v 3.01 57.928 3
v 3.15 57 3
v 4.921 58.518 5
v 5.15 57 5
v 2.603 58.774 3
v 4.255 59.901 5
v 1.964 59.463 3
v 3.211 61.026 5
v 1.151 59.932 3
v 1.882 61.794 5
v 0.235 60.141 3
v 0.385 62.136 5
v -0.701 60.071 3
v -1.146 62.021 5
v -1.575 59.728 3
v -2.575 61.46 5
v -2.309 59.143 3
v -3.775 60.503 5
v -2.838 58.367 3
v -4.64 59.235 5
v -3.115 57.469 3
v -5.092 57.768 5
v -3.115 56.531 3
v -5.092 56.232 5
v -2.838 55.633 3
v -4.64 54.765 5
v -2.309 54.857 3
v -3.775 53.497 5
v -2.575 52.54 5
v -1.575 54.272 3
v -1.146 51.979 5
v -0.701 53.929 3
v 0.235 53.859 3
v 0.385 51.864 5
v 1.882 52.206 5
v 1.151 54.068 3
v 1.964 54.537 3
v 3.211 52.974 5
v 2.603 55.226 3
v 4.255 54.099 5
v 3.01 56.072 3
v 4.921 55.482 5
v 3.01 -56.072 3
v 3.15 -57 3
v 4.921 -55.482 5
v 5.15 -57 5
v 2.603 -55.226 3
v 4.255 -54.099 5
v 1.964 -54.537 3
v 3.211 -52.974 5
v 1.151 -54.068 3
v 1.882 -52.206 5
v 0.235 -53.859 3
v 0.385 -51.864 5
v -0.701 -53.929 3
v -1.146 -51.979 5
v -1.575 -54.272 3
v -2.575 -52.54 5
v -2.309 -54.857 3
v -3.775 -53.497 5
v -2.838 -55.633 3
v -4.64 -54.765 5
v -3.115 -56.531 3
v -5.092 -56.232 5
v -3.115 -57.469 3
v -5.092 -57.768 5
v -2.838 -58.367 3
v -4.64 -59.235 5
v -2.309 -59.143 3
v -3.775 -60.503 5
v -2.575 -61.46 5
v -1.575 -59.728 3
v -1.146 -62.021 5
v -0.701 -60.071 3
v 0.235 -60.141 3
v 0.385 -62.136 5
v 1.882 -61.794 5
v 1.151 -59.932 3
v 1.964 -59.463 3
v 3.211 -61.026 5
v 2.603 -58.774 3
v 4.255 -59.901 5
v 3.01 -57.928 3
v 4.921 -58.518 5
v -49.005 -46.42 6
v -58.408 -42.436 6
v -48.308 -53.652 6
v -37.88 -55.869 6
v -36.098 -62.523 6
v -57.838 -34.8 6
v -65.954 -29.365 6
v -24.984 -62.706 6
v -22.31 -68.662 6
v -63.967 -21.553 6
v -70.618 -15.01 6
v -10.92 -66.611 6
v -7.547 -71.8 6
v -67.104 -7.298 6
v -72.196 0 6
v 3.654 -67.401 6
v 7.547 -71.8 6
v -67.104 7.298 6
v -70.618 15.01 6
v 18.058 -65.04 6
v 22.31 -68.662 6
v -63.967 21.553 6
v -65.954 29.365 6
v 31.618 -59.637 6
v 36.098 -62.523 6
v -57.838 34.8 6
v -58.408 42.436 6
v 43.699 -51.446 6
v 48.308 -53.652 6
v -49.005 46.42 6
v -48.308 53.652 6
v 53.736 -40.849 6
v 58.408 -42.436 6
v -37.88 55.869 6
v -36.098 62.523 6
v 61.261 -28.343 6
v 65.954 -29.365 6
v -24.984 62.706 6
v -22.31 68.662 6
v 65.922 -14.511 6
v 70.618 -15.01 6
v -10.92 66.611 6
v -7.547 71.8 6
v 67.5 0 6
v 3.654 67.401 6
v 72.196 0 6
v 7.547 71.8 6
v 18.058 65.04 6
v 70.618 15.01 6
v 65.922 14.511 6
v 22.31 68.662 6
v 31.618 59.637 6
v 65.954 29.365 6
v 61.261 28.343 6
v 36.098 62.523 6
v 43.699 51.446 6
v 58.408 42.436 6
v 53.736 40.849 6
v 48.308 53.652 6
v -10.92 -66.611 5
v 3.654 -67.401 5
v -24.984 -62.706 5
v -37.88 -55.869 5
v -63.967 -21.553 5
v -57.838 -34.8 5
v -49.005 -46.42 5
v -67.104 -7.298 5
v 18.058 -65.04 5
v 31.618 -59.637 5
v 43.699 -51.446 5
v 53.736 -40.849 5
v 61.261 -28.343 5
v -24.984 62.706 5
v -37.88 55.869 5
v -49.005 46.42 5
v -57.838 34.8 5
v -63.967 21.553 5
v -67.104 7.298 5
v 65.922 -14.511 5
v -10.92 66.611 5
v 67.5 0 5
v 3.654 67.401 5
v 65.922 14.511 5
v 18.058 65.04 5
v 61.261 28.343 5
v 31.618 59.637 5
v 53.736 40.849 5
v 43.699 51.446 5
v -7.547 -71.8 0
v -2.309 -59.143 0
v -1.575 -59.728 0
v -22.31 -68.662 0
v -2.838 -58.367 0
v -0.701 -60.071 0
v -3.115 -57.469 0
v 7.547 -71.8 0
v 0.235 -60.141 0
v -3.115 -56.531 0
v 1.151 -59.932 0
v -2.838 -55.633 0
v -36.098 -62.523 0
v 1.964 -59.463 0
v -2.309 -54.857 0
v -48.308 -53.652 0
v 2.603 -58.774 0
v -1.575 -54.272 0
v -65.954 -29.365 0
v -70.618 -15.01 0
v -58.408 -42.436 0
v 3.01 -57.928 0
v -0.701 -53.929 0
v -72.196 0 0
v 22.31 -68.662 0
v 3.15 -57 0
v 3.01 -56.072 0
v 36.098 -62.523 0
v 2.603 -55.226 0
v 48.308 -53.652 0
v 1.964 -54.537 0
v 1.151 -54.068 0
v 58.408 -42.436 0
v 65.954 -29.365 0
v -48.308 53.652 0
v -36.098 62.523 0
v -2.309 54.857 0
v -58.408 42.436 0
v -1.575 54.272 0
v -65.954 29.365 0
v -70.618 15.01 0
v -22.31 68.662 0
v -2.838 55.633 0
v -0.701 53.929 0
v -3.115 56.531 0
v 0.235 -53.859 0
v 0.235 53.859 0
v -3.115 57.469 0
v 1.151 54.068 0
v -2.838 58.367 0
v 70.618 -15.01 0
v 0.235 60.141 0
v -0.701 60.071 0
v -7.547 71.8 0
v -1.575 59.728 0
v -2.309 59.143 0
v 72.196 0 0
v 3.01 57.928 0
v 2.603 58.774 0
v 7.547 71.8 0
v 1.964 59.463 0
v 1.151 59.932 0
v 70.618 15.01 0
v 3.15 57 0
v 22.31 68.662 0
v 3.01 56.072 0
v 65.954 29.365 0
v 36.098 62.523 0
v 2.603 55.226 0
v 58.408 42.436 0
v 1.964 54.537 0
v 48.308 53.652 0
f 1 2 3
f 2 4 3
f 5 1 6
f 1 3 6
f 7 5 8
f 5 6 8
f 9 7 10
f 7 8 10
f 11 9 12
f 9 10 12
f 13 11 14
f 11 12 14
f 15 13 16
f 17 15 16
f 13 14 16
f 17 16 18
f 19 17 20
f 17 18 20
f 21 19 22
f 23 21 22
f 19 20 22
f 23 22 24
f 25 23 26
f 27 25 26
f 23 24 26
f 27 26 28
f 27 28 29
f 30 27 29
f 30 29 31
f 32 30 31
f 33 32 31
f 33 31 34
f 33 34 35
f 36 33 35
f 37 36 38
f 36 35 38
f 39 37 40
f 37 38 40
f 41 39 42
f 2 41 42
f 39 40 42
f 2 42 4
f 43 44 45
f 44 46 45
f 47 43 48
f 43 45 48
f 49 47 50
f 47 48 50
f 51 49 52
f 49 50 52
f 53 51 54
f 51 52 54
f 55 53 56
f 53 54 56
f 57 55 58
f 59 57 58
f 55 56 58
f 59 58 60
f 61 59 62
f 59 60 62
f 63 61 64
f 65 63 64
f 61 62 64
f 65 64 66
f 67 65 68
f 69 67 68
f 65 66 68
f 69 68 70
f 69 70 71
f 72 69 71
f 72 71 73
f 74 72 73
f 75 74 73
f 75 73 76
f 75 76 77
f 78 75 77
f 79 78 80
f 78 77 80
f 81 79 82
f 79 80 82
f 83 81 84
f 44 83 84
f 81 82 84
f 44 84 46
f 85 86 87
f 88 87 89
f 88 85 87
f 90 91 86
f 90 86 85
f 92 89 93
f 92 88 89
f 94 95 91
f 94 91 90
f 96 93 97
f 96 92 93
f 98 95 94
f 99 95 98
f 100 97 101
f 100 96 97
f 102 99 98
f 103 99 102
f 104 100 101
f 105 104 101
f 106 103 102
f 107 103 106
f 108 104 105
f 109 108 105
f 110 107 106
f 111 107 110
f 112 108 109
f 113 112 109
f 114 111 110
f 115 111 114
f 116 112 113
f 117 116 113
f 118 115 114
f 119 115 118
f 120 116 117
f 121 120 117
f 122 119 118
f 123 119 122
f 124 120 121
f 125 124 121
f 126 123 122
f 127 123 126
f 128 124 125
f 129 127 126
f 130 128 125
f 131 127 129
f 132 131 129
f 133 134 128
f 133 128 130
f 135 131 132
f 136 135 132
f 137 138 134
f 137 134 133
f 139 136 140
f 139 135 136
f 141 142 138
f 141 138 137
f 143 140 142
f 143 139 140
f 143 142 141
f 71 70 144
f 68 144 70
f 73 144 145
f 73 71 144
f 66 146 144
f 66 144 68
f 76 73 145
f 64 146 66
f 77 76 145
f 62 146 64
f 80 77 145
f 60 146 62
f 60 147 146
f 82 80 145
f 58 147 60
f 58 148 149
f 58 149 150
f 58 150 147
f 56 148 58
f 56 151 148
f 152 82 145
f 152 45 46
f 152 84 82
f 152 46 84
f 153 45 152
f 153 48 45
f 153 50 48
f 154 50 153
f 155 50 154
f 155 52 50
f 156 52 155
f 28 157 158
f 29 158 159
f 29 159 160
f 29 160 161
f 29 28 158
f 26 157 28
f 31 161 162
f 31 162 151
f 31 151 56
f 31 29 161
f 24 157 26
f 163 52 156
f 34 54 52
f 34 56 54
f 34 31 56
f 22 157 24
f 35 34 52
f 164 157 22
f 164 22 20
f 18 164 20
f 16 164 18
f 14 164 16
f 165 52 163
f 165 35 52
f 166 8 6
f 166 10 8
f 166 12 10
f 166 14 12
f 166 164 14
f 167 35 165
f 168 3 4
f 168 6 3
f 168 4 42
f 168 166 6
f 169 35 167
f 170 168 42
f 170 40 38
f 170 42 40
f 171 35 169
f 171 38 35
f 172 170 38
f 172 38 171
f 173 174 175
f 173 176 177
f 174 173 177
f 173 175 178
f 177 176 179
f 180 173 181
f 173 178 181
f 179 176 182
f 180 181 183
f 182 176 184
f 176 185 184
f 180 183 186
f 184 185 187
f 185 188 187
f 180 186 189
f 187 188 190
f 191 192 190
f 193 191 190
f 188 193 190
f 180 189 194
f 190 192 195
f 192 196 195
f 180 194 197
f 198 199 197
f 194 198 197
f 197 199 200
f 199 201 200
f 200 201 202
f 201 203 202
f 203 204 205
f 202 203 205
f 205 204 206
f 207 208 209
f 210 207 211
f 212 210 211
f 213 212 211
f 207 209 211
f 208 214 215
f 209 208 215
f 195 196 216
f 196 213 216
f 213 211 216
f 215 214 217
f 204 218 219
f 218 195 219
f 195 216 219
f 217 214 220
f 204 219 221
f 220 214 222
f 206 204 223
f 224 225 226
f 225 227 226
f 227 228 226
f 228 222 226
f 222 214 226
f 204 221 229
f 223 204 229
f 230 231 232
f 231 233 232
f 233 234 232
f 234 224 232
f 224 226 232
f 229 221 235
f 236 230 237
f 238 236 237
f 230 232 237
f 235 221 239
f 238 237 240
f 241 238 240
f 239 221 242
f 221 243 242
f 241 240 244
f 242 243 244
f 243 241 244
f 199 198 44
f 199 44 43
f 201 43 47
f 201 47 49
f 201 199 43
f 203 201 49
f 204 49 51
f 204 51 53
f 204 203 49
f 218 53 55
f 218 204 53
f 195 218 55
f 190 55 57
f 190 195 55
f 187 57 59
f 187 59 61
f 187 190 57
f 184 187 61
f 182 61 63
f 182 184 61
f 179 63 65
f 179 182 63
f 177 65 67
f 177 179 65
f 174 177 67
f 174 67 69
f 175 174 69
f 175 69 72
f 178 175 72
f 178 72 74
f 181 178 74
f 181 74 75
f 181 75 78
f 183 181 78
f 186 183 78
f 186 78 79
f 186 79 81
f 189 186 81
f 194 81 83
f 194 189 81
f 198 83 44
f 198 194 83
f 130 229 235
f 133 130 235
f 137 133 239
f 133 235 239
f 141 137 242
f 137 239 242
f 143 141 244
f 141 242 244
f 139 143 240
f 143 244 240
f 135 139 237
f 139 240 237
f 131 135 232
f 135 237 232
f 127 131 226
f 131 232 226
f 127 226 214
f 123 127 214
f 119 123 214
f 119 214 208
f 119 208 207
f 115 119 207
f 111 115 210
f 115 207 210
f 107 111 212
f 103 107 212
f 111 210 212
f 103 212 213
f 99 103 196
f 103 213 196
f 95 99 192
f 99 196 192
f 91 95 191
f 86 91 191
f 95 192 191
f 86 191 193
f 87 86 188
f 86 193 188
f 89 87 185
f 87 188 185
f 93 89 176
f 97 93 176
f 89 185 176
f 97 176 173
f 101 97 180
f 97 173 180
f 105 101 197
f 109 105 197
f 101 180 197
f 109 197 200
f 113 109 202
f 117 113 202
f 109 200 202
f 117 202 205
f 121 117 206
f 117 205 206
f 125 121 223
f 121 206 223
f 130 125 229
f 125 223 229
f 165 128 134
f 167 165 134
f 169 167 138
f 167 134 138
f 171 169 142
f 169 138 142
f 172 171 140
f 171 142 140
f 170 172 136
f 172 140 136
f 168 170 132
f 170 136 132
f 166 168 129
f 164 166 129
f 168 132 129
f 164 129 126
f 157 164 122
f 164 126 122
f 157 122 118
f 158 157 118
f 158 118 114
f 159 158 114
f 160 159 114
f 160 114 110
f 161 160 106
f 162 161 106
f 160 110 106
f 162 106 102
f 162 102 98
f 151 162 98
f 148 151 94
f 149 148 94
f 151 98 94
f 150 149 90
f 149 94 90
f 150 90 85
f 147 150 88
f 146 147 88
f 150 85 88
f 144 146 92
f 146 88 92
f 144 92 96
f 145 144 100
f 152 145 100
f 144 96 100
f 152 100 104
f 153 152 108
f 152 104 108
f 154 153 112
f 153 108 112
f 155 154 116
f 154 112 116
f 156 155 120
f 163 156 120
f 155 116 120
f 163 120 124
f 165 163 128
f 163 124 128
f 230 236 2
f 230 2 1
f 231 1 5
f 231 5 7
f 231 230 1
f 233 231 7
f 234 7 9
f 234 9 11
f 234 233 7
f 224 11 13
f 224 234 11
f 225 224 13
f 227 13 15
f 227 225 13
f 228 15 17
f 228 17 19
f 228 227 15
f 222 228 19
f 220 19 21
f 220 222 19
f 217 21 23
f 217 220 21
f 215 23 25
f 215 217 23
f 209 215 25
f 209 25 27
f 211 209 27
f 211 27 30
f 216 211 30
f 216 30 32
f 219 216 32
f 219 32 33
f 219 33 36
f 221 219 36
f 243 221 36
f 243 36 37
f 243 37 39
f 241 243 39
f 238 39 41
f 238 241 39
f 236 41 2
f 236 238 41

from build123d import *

# Parameters (mm, degrees)
F0_R     = 24.06525
F0_R_2   = 1.05
F1_DEPTH = 2
F2_SIZE  = 1
F3_SCALE = 3
F4_R     = 67.5
F5_DEPTH = 1


with BuildPart() as f1:
    # F0 (on Top) → F1 (new body)
    with BuildSketch(Plane.XY):
        Circle(F0_R)
        with Locations((0, -19)):
            Circle(F0_R_2, mode=Mode.SUBTRACT)
        with Locations((0, 19)):
            Circle(F0_R_2, mode=Mode.SUBTRACT)
    extrude(amount=F1_DEPTH)

    # F2
    f2_edges = [f1.edges().sort_by_distance(p)[0] for p in [
        (-1.05, 19, 2),
        (-1.05, -19, 2),
    ]]
    chamfer(f2_edges, length=F2_SIZE)


with BuildPart() as f1_1:
    # F3: moved
    add(f1.part.scale(F3_SCALE))

    # F4 (on face) → F5 (cut)
    with BuildSketch(Plane.XY.offset(6)):
        Circle(F4_R)
    extrude(amount=-F5_DEPTH, mode=Mode.SUBTRACT)


solid = f1_1.part
